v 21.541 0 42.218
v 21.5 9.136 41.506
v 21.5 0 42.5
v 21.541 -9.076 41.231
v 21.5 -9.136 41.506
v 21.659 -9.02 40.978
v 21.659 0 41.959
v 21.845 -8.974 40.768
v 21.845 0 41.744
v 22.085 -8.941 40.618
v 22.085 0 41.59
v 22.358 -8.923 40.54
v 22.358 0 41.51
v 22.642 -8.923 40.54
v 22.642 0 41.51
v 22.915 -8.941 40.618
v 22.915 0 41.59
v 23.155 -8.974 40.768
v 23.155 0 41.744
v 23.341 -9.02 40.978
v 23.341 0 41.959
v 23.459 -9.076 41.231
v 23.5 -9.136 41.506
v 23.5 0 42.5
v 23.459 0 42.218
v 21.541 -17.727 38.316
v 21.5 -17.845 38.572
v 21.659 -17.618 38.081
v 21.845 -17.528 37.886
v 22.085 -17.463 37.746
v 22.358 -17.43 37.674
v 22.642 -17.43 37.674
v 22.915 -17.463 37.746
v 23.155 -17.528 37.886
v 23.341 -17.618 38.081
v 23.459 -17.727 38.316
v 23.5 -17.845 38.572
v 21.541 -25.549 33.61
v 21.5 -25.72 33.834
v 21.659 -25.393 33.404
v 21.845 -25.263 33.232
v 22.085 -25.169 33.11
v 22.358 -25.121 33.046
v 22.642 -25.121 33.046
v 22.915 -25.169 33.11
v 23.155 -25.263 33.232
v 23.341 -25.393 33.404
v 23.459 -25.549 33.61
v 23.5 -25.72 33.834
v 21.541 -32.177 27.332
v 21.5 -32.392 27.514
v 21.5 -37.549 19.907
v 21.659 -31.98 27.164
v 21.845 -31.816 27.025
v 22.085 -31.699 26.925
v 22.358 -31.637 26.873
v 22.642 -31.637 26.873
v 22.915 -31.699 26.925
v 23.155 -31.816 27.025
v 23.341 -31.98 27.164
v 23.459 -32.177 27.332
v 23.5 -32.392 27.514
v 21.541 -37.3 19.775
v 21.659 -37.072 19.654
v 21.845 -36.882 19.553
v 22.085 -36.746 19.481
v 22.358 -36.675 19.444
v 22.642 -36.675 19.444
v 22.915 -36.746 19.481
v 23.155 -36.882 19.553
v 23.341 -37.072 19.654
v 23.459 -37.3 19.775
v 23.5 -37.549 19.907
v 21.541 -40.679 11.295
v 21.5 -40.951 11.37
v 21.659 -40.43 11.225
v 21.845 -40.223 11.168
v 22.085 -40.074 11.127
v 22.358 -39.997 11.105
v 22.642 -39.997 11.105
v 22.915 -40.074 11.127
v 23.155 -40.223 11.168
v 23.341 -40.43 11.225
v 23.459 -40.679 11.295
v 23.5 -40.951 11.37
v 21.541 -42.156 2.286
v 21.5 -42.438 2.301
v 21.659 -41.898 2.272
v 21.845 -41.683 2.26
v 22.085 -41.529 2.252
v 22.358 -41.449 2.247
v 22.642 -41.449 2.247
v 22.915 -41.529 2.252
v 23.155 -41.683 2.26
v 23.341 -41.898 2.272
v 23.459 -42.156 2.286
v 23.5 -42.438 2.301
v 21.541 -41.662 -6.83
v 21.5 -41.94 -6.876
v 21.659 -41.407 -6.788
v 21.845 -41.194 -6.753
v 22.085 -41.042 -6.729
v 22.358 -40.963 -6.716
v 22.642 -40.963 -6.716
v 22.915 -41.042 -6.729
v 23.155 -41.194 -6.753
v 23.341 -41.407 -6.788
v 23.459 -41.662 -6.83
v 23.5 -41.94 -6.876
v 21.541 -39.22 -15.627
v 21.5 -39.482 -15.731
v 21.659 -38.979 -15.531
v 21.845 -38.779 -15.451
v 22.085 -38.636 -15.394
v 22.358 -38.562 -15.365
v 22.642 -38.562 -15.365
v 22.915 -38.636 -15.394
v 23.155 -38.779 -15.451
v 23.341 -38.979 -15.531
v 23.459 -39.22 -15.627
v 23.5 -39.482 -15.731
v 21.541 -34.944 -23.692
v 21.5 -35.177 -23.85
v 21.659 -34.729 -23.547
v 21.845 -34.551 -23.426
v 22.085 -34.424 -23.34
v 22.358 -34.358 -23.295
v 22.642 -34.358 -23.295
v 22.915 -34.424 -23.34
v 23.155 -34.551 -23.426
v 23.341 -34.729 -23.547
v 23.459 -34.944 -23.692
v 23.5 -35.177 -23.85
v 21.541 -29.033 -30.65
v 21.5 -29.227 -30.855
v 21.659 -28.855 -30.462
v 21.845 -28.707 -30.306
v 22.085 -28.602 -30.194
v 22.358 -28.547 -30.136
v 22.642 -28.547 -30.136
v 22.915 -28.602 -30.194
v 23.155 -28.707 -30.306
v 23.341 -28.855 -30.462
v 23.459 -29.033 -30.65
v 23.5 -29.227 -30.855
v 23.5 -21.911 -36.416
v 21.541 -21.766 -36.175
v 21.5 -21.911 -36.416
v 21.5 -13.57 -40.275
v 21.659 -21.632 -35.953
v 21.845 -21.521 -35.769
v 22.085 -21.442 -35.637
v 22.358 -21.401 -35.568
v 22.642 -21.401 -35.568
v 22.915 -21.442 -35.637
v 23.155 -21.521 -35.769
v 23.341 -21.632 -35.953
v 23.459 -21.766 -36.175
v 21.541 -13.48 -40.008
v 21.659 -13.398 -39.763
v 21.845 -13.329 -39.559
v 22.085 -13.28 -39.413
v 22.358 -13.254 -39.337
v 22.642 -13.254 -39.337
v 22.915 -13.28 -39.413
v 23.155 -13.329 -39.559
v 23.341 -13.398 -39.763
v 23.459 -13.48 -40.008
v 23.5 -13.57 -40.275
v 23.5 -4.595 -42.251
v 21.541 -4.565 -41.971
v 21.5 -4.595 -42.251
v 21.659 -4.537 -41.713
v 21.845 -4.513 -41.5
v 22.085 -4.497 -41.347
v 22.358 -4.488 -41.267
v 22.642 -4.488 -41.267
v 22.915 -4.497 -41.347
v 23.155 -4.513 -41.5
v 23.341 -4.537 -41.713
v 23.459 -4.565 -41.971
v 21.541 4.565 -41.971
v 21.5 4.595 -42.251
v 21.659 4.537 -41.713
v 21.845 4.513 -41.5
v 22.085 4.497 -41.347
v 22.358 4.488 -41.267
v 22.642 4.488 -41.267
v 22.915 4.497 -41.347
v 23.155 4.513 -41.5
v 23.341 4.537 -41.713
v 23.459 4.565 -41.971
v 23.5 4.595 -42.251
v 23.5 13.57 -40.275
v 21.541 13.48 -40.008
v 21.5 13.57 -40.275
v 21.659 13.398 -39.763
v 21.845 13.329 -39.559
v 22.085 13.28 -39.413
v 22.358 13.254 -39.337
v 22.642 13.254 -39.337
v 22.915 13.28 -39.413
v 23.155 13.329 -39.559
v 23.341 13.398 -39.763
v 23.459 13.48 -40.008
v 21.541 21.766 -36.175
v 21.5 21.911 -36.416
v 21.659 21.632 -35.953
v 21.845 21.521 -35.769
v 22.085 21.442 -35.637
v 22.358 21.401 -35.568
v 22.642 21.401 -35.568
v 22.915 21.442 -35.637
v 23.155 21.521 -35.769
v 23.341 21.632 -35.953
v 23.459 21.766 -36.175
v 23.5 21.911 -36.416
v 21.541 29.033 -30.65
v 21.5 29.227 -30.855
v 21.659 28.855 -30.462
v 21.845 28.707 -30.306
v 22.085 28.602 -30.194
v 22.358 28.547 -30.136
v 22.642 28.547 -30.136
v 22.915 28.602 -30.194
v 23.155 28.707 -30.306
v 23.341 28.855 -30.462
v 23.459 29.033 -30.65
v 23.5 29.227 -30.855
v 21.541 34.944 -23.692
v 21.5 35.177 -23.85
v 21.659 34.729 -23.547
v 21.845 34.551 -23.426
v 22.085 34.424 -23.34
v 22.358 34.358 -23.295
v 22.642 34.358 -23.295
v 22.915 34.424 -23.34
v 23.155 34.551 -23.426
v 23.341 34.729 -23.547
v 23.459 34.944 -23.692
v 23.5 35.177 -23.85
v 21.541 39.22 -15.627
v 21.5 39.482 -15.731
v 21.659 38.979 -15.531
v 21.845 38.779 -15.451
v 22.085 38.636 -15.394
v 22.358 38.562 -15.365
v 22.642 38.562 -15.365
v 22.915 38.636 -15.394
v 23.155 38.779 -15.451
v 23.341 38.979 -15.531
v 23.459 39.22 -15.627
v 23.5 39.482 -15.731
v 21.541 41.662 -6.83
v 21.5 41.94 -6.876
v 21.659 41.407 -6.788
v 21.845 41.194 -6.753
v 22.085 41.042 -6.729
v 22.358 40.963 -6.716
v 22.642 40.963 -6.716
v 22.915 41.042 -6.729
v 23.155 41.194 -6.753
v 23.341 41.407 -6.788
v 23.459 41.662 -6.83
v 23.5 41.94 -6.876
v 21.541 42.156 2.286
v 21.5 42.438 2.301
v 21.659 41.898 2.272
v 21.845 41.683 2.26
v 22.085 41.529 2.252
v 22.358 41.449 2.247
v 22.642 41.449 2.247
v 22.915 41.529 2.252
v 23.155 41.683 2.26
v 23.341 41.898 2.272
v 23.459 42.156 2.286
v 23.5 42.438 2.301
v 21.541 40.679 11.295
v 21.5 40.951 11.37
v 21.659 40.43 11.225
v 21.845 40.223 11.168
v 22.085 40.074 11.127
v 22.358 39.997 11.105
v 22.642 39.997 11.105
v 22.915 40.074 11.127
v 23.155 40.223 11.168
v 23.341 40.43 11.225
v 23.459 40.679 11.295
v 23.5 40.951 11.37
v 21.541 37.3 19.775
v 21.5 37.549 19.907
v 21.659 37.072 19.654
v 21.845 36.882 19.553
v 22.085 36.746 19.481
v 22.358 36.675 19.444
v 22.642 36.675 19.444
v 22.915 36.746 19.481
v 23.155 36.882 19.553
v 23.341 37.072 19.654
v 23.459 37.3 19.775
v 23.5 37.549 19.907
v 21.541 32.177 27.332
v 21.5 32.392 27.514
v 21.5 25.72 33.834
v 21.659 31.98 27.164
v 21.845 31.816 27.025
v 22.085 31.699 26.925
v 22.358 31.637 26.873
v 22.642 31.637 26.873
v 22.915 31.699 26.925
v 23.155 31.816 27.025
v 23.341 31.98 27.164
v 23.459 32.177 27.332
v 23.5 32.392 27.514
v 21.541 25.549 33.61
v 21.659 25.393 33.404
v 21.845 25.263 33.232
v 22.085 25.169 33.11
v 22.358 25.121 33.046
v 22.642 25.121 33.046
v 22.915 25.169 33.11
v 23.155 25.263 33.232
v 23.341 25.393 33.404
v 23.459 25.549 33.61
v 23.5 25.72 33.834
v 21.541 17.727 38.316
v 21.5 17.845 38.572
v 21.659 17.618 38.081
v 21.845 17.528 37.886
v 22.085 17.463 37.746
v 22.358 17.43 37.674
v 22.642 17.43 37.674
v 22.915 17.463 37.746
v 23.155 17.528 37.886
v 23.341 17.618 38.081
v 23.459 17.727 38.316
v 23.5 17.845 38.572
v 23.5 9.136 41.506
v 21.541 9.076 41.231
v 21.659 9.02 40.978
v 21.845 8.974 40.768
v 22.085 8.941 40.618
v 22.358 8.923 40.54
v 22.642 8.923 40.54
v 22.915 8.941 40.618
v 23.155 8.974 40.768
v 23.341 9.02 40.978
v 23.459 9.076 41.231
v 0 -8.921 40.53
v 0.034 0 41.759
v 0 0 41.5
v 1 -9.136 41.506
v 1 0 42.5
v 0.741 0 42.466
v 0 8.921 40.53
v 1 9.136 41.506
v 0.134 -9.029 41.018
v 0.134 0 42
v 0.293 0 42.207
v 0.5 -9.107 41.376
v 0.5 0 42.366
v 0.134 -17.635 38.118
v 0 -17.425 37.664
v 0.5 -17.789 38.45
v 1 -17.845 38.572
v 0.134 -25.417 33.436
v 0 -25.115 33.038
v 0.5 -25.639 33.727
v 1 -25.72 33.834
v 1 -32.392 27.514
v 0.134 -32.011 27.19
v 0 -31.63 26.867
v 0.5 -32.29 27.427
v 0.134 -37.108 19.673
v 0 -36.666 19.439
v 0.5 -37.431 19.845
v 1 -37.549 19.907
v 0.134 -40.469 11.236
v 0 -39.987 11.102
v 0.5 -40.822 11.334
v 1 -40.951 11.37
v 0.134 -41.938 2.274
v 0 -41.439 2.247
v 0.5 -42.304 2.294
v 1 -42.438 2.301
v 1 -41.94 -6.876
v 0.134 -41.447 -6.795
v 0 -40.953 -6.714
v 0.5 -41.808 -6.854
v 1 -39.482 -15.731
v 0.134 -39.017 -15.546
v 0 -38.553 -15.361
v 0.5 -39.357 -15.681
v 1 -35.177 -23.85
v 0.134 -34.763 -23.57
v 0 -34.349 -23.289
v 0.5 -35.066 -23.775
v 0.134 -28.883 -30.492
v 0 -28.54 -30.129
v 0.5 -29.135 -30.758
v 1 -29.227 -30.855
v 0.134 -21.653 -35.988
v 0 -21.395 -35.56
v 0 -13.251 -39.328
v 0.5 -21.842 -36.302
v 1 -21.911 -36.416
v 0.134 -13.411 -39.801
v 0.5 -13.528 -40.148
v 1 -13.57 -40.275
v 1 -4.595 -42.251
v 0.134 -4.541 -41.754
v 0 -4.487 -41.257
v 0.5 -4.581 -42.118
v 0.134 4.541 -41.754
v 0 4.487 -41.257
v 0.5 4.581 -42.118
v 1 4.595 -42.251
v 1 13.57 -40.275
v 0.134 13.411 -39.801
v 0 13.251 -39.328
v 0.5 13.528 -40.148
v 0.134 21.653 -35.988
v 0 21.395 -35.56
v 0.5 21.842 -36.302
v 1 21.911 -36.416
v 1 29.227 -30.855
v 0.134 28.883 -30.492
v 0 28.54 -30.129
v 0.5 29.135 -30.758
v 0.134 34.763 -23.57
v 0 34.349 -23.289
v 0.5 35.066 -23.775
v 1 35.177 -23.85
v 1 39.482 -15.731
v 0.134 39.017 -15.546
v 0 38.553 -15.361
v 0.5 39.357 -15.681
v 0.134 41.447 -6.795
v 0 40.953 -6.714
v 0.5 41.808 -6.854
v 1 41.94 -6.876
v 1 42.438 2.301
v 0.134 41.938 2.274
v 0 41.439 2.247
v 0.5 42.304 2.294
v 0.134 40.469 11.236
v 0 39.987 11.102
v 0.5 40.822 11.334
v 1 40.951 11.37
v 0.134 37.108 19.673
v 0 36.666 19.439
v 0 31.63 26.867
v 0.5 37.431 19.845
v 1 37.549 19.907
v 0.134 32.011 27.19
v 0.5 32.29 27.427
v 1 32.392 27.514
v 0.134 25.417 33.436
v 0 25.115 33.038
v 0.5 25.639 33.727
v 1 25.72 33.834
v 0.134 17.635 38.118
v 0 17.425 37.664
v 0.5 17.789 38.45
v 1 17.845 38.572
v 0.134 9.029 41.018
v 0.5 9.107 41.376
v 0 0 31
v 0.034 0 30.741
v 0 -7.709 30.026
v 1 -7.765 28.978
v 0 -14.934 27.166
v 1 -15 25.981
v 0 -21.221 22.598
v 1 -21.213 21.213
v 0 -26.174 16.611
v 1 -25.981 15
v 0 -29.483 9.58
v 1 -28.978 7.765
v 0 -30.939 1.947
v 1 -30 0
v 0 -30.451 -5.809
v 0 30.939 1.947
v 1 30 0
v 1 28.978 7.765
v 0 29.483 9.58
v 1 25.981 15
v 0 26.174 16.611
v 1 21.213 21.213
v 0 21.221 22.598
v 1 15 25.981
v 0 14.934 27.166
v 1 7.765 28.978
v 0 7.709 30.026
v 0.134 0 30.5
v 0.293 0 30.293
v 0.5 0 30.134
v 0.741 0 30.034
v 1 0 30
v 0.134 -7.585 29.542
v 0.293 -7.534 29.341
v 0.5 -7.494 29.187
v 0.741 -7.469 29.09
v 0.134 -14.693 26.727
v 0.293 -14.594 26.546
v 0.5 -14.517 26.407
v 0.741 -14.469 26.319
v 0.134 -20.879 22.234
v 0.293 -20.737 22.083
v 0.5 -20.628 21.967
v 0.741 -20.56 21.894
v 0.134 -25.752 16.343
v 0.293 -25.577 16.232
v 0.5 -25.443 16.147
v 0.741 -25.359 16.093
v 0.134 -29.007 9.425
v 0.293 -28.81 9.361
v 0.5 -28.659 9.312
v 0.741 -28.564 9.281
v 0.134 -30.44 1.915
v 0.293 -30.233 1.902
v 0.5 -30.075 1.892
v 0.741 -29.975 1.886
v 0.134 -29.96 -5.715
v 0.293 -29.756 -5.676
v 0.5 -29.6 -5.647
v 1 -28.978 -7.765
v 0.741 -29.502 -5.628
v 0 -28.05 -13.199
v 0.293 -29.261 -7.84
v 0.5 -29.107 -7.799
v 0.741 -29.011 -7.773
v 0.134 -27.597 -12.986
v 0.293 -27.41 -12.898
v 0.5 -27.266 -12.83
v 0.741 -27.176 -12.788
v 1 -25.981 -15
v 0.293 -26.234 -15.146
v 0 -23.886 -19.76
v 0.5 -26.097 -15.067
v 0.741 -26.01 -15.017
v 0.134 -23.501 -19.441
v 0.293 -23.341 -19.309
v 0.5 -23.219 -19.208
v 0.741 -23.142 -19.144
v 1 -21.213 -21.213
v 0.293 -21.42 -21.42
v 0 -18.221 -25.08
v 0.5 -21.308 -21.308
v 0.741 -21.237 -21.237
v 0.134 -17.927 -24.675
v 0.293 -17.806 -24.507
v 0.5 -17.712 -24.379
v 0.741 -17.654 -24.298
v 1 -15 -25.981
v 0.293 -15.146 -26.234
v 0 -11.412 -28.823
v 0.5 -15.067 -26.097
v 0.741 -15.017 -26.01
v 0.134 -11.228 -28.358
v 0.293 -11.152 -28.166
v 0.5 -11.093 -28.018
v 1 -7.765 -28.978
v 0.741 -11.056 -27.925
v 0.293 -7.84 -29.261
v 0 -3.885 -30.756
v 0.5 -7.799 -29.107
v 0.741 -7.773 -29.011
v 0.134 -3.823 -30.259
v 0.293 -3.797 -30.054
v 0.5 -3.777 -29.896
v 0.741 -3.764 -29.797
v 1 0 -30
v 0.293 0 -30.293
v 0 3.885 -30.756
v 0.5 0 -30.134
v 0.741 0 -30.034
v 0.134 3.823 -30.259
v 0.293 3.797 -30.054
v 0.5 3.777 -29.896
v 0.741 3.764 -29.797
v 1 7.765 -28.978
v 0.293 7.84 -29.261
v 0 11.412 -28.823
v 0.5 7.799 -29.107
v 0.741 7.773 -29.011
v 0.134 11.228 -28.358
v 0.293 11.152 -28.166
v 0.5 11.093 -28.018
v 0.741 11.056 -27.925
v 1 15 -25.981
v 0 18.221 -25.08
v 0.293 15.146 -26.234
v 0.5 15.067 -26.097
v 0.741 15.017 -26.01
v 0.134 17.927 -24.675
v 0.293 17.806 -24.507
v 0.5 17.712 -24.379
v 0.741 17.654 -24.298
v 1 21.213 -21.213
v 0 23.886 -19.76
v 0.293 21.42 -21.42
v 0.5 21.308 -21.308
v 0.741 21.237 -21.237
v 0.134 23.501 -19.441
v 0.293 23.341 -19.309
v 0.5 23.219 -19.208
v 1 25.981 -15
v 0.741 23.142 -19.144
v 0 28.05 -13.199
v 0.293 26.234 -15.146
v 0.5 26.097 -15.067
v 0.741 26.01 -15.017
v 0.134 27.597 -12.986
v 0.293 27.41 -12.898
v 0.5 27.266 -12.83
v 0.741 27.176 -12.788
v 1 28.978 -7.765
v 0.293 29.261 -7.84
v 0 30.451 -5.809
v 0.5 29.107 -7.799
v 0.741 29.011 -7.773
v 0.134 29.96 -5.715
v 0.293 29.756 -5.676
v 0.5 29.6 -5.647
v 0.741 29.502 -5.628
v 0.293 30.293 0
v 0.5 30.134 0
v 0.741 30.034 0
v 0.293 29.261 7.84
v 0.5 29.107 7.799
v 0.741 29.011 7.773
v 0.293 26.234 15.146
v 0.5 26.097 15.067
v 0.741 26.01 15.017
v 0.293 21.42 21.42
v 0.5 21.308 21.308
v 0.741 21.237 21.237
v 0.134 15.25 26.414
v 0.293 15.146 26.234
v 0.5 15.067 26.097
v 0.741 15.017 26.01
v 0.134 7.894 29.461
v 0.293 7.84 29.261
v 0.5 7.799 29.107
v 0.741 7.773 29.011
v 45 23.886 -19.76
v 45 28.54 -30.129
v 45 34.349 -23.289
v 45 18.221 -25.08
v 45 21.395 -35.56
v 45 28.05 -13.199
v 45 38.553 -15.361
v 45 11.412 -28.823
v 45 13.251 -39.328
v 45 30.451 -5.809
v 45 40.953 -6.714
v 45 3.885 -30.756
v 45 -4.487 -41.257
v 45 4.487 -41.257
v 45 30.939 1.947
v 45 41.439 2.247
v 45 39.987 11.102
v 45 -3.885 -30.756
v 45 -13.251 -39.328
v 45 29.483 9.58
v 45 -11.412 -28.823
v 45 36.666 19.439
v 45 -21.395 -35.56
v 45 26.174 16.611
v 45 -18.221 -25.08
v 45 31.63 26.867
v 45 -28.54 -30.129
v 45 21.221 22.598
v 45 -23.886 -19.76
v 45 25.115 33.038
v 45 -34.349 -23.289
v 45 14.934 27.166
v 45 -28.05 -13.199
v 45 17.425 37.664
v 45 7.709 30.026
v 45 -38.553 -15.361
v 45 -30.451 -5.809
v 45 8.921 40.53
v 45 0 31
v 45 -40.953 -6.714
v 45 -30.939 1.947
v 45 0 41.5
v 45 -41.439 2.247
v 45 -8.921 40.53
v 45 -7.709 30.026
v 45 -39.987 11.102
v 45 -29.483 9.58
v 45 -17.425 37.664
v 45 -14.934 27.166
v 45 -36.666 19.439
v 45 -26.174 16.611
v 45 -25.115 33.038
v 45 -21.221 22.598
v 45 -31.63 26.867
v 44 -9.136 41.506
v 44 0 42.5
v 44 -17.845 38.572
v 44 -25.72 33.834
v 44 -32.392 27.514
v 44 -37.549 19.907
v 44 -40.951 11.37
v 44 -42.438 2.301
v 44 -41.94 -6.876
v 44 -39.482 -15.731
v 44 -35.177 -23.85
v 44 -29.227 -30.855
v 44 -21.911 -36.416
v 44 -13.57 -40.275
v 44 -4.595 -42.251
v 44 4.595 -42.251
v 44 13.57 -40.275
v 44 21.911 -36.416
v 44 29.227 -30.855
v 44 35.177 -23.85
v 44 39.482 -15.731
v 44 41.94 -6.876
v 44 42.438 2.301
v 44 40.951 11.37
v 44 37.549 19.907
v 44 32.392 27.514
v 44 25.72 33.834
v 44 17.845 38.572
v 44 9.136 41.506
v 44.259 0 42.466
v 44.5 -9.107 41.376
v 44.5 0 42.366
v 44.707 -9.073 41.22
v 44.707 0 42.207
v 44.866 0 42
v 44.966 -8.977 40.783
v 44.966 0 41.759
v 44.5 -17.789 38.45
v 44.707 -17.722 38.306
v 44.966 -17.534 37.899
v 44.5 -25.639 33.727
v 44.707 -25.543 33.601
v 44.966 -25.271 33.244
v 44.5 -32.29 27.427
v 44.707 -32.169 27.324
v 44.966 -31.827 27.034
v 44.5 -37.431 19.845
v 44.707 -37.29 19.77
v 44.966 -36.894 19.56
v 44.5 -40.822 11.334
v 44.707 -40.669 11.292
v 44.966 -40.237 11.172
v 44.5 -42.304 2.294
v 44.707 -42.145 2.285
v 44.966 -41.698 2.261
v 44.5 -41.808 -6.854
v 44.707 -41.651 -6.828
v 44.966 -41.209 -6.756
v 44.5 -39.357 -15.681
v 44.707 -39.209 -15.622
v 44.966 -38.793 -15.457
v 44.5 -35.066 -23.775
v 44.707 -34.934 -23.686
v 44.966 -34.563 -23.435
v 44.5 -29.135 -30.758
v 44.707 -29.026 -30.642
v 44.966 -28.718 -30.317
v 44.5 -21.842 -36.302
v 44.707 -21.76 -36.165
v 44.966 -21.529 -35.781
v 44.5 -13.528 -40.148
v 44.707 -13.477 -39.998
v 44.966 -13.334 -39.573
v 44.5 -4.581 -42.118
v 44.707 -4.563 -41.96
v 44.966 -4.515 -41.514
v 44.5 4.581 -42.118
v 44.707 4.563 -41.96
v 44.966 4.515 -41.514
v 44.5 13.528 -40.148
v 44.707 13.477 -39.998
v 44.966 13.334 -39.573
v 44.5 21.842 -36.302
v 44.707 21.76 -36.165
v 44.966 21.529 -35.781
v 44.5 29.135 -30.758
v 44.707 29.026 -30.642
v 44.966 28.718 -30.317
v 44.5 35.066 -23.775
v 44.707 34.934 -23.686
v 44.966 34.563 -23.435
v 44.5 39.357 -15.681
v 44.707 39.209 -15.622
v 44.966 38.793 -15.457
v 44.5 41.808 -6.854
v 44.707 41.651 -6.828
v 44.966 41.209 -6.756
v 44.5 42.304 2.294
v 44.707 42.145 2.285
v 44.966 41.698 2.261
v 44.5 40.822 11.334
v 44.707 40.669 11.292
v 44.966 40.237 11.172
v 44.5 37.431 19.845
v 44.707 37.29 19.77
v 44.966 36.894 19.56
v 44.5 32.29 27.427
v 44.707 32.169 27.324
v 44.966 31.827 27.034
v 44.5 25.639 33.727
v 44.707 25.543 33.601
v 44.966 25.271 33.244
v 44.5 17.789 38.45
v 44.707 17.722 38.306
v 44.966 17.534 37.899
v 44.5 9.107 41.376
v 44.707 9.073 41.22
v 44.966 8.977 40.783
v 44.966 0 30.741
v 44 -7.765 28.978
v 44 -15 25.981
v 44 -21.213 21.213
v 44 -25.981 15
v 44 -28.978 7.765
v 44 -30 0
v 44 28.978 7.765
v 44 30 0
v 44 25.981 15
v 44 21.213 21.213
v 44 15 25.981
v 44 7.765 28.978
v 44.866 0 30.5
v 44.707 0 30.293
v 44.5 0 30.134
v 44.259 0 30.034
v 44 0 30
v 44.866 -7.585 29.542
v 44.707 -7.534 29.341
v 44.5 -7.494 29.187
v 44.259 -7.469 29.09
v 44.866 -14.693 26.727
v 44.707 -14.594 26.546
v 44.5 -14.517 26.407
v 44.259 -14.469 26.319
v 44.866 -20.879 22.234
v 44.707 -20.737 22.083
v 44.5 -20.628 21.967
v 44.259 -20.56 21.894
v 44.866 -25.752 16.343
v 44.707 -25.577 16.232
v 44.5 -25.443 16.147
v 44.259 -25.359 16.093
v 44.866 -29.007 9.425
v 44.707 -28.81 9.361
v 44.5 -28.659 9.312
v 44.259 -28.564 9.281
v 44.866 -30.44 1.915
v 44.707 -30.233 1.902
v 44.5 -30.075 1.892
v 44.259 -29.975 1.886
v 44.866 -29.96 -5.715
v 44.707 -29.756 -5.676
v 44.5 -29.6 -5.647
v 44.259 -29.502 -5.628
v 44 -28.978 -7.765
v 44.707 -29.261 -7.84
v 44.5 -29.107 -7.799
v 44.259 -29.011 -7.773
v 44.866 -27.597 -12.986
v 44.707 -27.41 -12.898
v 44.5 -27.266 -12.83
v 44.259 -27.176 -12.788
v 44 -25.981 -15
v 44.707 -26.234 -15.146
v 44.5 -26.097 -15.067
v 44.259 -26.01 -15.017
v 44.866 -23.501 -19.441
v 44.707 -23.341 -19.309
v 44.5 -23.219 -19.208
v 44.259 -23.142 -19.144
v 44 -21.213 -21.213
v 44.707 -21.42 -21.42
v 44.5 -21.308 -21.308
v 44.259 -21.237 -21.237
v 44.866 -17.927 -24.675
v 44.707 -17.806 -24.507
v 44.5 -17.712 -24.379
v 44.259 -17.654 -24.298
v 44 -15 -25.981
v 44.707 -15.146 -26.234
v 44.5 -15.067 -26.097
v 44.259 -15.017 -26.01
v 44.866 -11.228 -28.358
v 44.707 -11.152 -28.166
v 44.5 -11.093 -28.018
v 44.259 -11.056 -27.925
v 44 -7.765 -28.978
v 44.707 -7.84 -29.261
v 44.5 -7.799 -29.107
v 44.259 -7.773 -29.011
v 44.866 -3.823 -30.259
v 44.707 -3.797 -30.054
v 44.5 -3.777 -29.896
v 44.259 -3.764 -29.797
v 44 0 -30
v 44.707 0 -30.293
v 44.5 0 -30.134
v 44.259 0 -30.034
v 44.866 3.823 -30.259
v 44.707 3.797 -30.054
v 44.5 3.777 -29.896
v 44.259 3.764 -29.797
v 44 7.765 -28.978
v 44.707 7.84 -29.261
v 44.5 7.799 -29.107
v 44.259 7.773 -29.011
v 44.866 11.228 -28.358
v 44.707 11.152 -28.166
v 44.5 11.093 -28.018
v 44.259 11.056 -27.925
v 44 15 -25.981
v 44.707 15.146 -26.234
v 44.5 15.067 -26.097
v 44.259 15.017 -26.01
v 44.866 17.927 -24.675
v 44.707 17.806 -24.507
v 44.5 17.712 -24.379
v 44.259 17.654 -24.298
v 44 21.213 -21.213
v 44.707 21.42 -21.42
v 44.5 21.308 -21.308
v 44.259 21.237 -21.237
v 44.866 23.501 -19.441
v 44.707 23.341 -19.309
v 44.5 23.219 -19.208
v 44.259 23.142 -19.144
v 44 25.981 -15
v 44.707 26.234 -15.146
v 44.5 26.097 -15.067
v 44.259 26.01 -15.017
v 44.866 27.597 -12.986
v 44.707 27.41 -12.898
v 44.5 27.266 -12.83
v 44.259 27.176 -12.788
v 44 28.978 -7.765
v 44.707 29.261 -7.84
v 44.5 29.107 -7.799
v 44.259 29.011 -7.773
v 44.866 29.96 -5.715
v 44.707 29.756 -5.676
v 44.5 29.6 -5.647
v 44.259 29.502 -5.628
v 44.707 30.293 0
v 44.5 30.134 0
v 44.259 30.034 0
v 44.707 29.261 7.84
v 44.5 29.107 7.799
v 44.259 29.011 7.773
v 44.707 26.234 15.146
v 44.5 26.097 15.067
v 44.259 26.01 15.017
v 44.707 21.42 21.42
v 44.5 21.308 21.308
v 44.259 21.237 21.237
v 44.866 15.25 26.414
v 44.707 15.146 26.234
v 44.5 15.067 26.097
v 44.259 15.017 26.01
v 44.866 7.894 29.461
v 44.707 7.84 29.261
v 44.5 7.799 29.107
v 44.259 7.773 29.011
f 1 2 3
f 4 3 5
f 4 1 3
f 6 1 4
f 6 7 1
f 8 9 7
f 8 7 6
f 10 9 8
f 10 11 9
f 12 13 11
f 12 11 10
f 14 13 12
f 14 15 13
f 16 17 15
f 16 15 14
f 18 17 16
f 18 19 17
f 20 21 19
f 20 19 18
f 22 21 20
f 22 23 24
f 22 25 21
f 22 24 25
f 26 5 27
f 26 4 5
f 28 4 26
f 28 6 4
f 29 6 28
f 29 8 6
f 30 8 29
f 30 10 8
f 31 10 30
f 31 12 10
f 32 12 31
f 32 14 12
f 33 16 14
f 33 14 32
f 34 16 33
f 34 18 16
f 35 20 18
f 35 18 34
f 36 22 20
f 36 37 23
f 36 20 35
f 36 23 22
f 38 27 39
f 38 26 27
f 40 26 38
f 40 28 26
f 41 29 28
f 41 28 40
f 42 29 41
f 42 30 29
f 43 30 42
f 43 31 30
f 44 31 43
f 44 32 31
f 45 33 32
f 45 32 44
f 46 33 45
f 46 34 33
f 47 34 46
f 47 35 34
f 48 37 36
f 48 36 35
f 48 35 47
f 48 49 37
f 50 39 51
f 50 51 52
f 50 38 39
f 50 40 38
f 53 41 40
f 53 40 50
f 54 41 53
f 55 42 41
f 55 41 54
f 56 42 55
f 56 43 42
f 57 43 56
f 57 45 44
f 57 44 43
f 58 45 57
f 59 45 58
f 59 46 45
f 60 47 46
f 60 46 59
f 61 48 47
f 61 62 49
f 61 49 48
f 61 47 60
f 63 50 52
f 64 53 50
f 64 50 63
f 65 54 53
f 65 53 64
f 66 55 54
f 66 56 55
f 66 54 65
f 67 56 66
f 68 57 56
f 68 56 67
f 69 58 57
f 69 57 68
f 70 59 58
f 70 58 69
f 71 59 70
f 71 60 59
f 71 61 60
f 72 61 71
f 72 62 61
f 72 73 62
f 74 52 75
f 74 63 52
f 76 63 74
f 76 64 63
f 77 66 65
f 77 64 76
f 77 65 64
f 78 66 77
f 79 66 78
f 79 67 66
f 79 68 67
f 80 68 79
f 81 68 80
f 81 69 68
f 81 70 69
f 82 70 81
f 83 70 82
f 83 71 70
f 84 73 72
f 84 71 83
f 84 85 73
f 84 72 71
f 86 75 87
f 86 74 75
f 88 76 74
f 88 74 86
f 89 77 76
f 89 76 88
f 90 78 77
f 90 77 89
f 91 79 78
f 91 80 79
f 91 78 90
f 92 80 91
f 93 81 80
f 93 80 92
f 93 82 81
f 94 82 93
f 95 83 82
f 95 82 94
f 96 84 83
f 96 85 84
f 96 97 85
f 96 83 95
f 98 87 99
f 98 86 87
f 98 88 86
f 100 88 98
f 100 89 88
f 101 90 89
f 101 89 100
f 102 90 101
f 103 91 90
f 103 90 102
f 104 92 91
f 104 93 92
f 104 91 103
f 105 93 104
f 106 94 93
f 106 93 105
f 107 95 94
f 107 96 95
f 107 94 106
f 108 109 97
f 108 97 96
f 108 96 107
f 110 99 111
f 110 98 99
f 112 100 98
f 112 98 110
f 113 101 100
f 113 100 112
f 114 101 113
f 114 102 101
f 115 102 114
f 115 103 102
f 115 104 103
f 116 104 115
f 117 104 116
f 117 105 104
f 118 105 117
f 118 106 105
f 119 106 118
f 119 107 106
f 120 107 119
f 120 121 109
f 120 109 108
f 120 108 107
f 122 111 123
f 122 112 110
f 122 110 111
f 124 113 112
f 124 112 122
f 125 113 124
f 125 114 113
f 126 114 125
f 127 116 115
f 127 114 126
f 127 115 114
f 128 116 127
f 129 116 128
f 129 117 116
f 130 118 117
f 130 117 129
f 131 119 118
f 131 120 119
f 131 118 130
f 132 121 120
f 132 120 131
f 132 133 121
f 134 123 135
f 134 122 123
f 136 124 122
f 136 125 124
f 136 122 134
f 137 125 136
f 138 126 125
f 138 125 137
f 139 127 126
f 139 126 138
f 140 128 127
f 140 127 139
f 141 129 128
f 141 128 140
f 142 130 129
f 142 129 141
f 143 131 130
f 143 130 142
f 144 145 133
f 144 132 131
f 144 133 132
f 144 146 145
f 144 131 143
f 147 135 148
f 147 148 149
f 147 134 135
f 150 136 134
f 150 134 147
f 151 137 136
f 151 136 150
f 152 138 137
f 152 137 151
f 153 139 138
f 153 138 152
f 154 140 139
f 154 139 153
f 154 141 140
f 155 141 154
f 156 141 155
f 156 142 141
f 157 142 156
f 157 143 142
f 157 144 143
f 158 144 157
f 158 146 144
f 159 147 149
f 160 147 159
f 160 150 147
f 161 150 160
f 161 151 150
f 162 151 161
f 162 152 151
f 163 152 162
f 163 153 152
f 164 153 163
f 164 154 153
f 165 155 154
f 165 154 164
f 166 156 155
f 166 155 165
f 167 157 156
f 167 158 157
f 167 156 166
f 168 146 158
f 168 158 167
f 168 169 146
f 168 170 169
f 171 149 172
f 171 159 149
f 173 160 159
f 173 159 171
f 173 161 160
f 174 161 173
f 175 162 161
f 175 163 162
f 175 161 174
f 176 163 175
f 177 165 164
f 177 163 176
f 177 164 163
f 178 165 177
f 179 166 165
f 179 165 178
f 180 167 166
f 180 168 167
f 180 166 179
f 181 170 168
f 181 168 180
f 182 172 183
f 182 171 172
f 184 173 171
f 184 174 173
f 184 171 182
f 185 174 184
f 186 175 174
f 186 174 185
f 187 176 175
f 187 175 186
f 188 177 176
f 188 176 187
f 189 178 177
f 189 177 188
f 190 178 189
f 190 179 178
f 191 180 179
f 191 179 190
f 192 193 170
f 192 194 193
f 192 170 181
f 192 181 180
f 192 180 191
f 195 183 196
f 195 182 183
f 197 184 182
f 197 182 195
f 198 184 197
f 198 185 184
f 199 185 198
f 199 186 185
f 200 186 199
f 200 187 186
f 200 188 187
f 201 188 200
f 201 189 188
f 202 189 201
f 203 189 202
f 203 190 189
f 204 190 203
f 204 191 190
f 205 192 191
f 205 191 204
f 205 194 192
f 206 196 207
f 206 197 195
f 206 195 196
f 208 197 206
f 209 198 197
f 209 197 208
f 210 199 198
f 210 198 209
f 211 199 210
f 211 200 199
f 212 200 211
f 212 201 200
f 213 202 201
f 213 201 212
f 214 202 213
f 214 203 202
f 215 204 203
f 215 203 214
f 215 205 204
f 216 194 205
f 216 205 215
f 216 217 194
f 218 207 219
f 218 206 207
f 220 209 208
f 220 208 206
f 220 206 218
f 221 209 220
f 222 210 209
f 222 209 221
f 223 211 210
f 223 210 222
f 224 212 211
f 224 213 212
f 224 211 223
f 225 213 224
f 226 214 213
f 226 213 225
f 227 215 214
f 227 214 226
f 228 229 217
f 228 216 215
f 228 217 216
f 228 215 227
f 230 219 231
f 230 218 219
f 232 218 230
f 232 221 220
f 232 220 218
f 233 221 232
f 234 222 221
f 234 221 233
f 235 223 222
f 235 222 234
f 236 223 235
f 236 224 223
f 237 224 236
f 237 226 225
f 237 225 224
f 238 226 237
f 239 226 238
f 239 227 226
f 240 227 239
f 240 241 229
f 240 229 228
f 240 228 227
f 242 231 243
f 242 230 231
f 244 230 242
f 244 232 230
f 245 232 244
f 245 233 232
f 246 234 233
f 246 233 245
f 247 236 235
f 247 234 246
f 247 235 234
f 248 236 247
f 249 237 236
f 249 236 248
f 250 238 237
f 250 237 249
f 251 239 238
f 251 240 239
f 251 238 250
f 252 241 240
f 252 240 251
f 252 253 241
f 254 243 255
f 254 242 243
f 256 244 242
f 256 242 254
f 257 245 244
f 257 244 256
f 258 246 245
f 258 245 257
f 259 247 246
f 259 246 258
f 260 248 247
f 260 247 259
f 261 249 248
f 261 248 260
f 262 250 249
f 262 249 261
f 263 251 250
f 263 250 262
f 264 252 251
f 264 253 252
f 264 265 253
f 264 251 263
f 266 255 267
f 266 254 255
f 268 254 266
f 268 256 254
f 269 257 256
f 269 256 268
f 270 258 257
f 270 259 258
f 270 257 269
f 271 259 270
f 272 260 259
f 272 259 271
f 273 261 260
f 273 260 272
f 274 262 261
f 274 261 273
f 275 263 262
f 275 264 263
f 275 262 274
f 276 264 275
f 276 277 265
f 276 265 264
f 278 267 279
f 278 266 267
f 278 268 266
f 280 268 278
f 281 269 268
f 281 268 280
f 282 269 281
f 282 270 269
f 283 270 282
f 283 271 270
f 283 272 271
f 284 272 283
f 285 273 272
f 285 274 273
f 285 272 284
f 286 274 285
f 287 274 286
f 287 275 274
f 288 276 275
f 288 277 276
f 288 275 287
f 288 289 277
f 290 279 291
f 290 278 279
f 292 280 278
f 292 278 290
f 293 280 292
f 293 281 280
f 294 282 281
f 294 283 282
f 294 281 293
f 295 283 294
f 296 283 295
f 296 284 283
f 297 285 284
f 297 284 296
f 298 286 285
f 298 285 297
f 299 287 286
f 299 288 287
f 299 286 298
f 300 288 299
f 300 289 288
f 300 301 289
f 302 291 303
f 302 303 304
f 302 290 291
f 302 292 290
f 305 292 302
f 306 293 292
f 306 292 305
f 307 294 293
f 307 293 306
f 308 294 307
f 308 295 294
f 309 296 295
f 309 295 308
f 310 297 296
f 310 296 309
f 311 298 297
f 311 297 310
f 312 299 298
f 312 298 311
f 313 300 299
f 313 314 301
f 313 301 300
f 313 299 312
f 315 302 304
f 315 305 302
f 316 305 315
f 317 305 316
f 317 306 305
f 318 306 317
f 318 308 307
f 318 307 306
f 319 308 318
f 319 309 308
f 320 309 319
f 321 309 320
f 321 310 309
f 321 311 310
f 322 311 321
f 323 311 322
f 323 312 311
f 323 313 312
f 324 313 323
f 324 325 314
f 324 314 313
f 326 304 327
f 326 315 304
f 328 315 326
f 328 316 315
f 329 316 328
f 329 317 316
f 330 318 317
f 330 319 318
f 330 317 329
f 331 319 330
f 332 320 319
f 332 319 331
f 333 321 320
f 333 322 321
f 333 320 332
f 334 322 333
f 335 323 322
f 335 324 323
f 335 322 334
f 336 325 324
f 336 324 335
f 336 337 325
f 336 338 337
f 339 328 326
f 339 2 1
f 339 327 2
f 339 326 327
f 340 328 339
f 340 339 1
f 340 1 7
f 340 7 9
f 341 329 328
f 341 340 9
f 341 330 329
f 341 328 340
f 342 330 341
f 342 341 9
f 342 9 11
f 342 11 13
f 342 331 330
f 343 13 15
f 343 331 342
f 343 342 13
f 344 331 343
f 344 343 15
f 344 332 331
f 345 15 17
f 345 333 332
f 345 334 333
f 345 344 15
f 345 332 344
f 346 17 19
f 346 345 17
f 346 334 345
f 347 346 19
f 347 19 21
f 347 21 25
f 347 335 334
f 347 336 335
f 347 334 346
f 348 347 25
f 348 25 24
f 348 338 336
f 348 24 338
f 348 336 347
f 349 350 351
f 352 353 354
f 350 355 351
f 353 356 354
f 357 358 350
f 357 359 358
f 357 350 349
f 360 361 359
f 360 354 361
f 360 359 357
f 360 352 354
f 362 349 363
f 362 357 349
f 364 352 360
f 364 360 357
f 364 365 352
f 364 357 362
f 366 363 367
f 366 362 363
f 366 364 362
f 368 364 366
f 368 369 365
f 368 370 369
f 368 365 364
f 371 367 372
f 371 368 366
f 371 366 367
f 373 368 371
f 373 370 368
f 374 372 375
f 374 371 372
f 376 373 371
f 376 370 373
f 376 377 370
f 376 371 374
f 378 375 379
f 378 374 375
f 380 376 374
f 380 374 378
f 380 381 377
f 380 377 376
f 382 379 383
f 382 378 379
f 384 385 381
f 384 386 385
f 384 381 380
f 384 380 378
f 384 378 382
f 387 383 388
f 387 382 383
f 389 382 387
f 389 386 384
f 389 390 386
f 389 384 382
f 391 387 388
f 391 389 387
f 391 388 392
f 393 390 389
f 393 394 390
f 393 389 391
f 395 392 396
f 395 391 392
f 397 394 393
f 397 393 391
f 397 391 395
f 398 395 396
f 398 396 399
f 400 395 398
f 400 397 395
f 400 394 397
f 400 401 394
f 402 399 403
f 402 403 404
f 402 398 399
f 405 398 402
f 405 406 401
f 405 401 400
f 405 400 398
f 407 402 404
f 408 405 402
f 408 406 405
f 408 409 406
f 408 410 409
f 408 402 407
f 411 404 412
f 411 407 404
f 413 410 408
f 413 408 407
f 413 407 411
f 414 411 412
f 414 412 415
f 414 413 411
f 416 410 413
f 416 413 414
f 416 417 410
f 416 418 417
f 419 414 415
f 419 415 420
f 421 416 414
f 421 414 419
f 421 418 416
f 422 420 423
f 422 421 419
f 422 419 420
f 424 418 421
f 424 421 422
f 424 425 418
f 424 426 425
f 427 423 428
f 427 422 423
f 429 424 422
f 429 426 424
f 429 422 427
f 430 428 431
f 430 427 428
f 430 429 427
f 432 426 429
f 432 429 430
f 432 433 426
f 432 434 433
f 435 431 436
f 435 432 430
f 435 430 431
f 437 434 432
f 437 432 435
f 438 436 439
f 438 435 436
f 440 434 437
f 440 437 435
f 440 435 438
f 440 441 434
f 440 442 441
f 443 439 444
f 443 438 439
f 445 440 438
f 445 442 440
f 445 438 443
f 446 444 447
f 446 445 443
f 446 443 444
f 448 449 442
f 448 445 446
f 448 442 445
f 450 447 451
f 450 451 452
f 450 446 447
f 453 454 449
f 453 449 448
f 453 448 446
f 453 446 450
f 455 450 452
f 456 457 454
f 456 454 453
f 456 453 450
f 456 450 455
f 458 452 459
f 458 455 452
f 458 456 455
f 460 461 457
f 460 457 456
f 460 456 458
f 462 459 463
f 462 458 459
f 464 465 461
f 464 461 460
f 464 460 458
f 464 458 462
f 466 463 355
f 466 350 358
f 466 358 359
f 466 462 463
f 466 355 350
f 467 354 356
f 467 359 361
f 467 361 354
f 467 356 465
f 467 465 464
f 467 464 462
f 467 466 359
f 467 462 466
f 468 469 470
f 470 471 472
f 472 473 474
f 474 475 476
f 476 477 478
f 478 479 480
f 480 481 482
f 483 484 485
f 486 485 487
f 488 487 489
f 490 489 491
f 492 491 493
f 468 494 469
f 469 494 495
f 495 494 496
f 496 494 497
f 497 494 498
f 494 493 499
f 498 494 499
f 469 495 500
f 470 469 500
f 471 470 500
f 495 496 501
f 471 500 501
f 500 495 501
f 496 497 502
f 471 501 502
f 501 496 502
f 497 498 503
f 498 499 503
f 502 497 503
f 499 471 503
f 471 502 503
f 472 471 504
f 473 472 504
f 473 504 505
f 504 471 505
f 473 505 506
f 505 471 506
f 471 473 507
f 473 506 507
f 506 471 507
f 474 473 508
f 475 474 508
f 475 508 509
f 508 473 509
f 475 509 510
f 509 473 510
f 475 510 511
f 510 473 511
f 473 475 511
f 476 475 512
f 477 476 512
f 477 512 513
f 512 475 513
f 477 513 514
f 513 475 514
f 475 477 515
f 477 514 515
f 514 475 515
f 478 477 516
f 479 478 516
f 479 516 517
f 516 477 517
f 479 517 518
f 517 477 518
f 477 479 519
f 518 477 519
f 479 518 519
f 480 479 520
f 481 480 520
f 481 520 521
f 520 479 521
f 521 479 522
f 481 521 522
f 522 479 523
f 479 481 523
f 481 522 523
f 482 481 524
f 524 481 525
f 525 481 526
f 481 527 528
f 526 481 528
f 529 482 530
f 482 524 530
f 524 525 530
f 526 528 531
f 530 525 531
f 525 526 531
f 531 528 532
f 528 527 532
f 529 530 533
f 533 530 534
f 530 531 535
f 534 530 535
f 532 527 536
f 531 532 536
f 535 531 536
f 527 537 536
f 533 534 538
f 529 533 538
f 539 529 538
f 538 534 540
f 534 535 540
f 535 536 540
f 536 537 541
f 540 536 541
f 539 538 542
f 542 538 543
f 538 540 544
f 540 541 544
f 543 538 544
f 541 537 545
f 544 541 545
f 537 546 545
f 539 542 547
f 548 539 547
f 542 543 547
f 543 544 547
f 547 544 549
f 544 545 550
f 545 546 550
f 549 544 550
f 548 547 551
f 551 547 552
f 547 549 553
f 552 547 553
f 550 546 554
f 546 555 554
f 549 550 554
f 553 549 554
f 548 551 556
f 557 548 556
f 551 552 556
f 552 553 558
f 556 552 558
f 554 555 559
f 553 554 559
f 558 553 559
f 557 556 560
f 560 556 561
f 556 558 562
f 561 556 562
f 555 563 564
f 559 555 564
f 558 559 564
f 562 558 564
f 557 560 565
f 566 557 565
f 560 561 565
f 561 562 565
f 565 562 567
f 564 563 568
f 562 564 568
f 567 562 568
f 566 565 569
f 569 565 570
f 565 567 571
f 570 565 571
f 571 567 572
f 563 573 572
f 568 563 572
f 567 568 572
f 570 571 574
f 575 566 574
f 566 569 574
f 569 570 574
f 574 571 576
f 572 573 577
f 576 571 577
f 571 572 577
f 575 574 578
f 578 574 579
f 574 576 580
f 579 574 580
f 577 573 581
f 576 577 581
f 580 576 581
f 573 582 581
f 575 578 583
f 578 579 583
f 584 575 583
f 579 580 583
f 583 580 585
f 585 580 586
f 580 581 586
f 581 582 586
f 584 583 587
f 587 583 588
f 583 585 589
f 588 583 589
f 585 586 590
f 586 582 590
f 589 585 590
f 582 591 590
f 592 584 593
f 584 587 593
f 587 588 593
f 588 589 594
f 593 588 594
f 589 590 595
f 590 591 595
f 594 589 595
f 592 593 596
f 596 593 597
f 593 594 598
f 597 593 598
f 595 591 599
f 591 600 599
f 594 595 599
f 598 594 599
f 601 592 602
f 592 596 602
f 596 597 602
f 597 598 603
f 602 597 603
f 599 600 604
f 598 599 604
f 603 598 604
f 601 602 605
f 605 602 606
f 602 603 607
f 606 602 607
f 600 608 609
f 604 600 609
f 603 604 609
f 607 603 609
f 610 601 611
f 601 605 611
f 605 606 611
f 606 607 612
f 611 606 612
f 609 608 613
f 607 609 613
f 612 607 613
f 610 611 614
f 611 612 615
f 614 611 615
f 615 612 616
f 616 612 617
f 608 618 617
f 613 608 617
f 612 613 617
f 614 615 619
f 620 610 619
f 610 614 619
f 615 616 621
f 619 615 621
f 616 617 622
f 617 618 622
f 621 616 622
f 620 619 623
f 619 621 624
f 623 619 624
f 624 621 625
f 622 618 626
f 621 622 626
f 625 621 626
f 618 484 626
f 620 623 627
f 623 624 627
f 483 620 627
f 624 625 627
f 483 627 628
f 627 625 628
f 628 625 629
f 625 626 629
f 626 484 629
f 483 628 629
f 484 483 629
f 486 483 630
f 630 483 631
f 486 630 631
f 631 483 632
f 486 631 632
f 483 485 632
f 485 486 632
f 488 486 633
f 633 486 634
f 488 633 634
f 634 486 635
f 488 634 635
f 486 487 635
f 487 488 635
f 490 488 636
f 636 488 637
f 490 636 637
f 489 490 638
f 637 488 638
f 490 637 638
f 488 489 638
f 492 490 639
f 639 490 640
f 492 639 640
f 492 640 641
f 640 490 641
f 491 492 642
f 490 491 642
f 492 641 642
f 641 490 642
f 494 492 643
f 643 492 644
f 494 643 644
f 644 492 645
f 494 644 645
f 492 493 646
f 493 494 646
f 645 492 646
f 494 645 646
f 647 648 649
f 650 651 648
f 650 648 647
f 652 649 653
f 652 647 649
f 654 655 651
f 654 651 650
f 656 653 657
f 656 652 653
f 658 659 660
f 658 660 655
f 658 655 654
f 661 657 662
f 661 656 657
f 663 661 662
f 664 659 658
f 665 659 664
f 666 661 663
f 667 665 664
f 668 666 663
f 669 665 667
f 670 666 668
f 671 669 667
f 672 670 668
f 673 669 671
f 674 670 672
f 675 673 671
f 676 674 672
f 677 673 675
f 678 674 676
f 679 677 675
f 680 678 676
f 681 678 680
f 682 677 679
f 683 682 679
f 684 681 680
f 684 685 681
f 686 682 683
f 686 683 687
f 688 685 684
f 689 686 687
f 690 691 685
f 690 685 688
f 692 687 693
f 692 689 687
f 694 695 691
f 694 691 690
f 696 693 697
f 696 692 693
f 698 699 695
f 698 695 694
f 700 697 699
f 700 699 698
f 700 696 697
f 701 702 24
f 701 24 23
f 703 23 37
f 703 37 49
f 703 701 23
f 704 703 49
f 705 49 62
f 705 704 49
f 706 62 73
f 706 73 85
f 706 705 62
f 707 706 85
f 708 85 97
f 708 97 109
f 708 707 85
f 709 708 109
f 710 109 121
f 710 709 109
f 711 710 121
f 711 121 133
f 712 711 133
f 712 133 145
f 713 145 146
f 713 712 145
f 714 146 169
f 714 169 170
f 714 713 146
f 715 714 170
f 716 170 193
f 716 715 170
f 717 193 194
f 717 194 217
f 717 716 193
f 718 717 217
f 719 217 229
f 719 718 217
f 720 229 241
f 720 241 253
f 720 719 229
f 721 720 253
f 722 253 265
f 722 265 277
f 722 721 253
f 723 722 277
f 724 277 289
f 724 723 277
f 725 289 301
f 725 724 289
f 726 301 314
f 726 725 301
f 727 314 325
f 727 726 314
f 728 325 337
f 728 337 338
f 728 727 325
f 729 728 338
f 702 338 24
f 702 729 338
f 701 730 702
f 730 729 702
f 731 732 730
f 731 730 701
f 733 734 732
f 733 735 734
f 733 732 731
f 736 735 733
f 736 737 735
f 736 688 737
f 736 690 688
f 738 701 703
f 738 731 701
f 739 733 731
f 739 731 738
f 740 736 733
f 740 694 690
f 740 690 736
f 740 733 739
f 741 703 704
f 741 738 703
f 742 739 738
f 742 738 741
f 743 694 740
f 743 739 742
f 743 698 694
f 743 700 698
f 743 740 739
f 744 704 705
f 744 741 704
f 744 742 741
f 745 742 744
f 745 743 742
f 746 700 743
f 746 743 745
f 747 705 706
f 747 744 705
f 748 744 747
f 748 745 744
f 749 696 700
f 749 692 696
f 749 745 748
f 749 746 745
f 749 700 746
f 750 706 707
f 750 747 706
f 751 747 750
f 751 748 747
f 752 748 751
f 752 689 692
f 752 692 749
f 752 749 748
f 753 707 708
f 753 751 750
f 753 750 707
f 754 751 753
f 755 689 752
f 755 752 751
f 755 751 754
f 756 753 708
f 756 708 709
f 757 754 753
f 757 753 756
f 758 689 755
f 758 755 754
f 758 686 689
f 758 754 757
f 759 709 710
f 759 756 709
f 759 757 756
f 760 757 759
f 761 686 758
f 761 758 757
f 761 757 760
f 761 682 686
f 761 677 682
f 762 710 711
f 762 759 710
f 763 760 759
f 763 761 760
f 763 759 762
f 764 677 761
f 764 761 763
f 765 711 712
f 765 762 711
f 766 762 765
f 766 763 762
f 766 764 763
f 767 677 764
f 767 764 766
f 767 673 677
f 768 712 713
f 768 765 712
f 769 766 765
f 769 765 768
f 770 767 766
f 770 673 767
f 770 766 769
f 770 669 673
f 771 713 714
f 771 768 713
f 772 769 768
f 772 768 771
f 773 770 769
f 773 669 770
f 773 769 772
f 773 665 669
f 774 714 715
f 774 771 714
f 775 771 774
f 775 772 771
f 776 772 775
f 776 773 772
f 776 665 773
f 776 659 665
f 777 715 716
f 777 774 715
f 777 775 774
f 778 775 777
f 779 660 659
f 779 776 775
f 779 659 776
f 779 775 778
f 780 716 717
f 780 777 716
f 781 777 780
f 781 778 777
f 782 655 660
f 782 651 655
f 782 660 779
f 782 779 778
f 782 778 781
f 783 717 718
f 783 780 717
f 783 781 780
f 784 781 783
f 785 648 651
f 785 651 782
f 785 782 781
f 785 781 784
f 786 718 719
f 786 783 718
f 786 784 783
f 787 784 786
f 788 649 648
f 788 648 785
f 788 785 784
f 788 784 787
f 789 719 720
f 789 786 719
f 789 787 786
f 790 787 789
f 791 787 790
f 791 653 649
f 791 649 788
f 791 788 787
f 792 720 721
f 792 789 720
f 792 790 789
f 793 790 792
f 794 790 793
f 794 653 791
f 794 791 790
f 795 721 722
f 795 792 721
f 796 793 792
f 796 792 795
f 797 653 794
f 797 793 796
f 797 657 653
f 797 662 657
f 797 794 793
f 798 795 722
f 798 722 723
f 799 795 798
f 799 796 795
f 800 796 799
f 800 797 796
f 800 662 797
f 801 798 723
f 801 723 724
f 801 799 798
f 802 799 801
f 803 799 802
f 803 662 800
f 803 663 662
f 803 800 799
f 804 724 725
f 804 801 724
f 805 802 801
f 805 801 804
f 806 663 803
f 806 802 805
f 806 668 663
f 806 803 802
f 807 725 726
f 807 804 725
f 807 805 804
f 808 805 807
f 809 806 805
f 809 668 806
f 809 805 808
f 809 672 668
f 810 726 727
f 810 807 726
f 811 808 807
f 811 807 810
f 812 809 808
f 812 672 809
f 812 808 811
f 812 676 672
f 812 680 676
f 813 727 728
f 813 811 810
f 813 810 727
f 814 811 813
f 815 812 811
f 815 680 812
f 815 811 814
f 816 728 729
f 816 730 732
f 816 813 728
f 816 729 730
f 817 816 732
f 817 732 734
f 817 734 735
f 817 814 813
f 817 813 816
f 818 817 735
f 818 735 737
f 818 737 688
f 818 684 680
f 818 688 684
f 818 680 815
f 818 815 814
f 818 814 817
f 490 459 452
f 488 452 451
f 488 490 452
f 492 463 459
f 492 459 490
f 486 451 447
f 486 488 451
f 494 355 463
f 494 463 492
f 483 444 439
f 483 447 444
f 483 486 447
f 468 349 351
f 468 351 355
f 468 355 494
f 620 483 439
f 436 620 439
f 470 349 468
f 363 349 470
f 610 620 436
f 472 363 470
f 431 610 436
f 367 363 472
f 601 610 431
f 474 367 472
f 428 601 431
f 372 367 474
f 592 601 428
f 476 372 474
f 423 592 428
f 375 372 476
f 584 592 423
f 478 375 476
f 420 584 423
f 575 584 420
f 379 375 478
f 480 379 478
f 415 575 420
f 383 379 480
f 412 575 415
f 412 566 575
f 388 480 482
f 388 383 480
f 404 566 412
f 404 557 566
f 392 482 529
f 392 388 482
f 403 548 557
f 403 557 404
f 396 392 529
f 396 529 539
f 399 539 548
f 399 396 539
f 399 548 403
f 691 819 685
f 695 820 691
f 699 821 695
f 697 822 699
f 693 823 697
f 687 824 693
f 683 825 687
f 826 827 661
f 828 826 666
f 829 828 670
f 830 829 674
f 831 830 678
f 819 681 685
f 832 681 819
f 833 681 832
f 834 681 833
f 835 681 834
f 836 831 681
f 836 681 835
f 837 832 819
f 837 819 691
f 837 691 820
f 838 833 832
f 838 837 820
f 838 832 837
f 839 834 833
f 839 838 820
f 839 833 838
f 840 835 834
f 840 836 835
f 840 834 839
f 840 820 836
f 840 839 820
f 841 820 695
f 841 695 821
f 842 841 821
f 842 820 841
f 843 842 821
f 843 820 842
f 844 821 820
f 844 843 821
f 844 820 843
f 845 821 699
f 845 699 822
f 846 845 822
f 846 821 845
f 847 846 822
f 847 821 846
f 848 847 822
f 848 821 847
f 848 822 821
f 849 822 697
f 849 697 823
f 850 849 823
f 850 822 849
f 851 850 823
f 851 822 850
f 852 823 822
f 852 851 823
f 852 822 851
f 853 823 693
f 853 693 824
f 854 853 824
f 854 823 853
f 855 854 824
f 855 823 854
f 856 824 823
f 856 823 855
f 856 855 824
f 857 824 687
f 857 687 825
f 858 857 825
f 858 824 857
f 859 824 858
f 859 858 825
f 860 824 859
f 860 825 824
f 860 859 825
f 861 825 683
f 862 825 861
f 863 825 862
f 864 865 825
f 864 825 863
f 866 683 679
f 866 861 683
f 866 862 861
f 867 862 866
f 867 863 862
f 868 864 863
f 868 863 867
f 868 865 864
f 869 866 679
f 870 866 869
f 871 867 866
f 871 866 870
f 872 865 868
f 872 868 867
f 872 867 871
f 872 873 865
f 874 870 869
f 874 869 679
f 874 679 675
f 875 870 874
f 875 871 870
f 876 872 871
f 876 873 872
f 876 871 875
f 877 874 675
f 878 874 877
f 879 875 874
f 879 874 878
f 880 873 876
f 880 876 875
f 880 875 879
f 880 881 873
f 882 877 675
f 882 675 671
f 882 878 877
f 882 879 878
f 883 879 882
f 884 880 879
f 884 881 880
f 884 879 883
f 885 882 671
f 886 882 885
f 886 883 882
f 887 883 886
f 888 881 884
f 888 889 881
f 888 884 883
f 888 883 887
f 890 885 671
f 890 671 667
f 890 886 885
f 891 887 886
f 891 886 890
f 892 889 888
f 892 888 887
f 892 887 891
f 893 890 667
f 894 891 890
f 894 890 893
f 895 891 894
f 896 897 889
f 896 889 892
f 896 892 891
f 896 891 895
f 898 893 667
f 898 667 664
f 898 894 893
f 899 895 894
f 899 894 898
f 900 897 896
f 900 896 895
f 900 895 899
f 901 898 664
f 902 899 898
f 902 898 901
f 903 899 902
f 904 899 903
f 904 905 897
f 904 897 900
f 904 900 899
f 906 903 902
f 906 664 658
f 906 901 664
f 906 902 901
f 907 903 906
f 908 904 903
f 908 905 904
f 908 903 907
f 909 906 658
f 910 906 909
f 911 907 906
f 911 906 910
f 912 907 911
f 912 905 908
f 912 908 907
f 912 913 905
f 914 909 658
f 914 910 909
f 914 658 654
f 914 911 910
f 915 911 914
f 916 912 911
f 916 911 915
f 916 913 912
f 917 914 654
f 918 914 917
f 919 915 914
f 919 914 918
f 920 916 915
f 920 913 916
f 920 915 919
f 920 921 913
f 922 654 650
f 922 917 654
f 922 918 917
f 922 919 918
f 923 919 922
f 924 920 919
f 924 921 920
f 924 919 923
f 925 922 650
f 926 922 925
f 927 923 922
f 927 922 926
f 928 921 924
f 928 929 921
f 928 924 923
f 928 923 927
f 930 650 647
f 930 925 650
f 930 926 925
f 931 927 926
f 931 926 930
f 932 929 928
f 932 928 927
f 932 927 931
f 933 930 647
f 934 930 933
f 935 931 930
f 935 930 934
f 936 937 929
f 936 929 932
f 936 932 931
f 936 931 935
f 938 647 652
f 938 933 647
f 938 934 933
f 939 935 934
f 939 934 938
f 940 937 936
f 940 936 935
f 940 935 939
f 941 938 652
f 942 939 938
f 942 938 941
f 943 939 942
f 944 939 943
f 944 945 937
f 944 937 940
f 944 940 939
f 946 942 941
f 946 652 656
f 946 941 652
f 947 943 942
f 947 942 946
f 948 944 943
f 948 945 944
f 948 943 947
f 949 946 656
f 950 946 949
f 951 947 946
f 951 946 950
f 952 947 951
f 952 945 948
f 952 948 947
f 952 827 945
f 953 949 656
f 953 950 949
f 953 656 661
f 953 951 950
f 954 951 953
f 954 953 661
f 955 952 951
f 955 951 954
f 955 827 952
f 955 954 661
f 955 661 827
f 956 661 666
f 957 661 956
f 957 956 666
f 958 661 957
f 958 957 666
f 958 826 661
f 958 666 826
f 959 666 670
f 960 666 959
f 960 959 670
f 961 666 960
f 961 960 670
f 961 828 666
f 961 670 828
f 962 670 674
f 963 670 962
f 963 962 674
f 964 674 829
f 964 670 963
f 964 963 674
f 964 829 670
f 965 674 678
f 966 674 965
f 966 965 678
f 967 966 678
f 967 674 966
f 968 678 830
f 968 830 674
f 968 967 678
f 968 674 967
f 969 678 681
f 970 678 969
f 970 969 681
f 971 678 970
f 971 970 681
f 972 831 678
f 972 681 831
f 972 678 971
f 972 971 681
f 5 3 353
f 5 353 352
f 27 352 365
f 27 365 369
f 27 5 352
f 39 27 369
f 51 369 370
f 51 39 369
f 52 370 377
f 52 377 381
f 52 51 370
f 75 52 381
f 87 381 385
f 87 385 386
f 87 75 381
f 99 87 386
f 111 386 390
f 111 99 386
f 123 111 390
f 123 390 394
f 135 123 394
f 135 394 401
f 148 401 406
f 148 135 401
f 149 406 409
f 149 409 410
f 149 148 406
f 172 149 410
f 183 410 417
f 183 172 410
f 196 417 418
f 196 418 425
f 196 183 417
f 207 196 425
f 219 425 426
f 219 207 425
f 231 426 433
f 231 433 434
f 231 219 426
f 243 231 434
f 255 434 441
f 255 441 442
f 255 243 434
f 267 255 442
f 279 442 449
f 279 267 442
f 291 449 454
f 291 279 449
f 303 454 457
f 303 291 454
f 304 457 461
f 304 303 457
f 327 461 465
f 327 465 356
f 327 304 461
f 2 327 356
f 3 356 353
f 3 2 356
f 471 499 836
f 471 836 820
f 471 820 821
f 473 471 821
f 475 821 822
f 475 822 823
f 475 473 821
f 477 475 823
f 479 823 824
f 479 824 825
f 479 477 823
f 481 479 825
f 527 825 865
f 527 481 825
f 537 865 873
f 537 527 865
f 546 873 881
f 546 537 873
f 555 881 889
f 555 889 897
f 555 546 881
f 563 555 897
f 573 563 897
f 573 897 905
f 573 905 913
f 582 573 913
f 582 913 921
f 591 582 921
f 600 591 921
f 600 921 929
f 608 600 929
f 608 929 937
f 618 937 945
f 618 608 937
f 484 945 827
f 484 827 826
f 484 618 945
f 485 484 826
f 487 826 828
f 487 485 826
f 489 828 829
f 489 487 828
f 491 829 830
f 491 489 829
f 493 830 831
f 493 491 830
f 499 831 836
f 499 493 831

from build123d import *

# Parameters (mm, degrees)
FILLET1_R = 1


with BuildPart() as part:
    # Sketch1 → Revolve1 (revolve)
    with BuildSketch(Plane.XY, mode=Mode.PRIVATE) as revolve1_sk:
        with BuildLine():
            Line((0, 30), (0, 42.5))
            Line((0, 42.5), (21.5, 42.5))
            ThreePointArc((21.5, 42.5), (22.5, 41.5), (23.5, 42.5))
            Line((23.5, 42.5), (45, 42.5))
            Line((45, 42.5), (45, 30))
            Line((45, 30), (0, 30))
        make_face()
    revolve(revolve1_sk.sketch.rotate(Axis((0, 0, 0), (1, 0, 0)), 90), axis=Axis((0, 0, 0), (1, 0, 0)))

    # Fillet1
    fillet1_edges = [part.edges().sort_by_distance(p)[0] for p in [
        (0, 0, -30),
        (0, 0, -42.5),
        (45, 0, -42.5),
        (45, 0, -30),
    ]]
    fillet(fillet1_edges, radius=FILLET1_R)


solid = part.part
